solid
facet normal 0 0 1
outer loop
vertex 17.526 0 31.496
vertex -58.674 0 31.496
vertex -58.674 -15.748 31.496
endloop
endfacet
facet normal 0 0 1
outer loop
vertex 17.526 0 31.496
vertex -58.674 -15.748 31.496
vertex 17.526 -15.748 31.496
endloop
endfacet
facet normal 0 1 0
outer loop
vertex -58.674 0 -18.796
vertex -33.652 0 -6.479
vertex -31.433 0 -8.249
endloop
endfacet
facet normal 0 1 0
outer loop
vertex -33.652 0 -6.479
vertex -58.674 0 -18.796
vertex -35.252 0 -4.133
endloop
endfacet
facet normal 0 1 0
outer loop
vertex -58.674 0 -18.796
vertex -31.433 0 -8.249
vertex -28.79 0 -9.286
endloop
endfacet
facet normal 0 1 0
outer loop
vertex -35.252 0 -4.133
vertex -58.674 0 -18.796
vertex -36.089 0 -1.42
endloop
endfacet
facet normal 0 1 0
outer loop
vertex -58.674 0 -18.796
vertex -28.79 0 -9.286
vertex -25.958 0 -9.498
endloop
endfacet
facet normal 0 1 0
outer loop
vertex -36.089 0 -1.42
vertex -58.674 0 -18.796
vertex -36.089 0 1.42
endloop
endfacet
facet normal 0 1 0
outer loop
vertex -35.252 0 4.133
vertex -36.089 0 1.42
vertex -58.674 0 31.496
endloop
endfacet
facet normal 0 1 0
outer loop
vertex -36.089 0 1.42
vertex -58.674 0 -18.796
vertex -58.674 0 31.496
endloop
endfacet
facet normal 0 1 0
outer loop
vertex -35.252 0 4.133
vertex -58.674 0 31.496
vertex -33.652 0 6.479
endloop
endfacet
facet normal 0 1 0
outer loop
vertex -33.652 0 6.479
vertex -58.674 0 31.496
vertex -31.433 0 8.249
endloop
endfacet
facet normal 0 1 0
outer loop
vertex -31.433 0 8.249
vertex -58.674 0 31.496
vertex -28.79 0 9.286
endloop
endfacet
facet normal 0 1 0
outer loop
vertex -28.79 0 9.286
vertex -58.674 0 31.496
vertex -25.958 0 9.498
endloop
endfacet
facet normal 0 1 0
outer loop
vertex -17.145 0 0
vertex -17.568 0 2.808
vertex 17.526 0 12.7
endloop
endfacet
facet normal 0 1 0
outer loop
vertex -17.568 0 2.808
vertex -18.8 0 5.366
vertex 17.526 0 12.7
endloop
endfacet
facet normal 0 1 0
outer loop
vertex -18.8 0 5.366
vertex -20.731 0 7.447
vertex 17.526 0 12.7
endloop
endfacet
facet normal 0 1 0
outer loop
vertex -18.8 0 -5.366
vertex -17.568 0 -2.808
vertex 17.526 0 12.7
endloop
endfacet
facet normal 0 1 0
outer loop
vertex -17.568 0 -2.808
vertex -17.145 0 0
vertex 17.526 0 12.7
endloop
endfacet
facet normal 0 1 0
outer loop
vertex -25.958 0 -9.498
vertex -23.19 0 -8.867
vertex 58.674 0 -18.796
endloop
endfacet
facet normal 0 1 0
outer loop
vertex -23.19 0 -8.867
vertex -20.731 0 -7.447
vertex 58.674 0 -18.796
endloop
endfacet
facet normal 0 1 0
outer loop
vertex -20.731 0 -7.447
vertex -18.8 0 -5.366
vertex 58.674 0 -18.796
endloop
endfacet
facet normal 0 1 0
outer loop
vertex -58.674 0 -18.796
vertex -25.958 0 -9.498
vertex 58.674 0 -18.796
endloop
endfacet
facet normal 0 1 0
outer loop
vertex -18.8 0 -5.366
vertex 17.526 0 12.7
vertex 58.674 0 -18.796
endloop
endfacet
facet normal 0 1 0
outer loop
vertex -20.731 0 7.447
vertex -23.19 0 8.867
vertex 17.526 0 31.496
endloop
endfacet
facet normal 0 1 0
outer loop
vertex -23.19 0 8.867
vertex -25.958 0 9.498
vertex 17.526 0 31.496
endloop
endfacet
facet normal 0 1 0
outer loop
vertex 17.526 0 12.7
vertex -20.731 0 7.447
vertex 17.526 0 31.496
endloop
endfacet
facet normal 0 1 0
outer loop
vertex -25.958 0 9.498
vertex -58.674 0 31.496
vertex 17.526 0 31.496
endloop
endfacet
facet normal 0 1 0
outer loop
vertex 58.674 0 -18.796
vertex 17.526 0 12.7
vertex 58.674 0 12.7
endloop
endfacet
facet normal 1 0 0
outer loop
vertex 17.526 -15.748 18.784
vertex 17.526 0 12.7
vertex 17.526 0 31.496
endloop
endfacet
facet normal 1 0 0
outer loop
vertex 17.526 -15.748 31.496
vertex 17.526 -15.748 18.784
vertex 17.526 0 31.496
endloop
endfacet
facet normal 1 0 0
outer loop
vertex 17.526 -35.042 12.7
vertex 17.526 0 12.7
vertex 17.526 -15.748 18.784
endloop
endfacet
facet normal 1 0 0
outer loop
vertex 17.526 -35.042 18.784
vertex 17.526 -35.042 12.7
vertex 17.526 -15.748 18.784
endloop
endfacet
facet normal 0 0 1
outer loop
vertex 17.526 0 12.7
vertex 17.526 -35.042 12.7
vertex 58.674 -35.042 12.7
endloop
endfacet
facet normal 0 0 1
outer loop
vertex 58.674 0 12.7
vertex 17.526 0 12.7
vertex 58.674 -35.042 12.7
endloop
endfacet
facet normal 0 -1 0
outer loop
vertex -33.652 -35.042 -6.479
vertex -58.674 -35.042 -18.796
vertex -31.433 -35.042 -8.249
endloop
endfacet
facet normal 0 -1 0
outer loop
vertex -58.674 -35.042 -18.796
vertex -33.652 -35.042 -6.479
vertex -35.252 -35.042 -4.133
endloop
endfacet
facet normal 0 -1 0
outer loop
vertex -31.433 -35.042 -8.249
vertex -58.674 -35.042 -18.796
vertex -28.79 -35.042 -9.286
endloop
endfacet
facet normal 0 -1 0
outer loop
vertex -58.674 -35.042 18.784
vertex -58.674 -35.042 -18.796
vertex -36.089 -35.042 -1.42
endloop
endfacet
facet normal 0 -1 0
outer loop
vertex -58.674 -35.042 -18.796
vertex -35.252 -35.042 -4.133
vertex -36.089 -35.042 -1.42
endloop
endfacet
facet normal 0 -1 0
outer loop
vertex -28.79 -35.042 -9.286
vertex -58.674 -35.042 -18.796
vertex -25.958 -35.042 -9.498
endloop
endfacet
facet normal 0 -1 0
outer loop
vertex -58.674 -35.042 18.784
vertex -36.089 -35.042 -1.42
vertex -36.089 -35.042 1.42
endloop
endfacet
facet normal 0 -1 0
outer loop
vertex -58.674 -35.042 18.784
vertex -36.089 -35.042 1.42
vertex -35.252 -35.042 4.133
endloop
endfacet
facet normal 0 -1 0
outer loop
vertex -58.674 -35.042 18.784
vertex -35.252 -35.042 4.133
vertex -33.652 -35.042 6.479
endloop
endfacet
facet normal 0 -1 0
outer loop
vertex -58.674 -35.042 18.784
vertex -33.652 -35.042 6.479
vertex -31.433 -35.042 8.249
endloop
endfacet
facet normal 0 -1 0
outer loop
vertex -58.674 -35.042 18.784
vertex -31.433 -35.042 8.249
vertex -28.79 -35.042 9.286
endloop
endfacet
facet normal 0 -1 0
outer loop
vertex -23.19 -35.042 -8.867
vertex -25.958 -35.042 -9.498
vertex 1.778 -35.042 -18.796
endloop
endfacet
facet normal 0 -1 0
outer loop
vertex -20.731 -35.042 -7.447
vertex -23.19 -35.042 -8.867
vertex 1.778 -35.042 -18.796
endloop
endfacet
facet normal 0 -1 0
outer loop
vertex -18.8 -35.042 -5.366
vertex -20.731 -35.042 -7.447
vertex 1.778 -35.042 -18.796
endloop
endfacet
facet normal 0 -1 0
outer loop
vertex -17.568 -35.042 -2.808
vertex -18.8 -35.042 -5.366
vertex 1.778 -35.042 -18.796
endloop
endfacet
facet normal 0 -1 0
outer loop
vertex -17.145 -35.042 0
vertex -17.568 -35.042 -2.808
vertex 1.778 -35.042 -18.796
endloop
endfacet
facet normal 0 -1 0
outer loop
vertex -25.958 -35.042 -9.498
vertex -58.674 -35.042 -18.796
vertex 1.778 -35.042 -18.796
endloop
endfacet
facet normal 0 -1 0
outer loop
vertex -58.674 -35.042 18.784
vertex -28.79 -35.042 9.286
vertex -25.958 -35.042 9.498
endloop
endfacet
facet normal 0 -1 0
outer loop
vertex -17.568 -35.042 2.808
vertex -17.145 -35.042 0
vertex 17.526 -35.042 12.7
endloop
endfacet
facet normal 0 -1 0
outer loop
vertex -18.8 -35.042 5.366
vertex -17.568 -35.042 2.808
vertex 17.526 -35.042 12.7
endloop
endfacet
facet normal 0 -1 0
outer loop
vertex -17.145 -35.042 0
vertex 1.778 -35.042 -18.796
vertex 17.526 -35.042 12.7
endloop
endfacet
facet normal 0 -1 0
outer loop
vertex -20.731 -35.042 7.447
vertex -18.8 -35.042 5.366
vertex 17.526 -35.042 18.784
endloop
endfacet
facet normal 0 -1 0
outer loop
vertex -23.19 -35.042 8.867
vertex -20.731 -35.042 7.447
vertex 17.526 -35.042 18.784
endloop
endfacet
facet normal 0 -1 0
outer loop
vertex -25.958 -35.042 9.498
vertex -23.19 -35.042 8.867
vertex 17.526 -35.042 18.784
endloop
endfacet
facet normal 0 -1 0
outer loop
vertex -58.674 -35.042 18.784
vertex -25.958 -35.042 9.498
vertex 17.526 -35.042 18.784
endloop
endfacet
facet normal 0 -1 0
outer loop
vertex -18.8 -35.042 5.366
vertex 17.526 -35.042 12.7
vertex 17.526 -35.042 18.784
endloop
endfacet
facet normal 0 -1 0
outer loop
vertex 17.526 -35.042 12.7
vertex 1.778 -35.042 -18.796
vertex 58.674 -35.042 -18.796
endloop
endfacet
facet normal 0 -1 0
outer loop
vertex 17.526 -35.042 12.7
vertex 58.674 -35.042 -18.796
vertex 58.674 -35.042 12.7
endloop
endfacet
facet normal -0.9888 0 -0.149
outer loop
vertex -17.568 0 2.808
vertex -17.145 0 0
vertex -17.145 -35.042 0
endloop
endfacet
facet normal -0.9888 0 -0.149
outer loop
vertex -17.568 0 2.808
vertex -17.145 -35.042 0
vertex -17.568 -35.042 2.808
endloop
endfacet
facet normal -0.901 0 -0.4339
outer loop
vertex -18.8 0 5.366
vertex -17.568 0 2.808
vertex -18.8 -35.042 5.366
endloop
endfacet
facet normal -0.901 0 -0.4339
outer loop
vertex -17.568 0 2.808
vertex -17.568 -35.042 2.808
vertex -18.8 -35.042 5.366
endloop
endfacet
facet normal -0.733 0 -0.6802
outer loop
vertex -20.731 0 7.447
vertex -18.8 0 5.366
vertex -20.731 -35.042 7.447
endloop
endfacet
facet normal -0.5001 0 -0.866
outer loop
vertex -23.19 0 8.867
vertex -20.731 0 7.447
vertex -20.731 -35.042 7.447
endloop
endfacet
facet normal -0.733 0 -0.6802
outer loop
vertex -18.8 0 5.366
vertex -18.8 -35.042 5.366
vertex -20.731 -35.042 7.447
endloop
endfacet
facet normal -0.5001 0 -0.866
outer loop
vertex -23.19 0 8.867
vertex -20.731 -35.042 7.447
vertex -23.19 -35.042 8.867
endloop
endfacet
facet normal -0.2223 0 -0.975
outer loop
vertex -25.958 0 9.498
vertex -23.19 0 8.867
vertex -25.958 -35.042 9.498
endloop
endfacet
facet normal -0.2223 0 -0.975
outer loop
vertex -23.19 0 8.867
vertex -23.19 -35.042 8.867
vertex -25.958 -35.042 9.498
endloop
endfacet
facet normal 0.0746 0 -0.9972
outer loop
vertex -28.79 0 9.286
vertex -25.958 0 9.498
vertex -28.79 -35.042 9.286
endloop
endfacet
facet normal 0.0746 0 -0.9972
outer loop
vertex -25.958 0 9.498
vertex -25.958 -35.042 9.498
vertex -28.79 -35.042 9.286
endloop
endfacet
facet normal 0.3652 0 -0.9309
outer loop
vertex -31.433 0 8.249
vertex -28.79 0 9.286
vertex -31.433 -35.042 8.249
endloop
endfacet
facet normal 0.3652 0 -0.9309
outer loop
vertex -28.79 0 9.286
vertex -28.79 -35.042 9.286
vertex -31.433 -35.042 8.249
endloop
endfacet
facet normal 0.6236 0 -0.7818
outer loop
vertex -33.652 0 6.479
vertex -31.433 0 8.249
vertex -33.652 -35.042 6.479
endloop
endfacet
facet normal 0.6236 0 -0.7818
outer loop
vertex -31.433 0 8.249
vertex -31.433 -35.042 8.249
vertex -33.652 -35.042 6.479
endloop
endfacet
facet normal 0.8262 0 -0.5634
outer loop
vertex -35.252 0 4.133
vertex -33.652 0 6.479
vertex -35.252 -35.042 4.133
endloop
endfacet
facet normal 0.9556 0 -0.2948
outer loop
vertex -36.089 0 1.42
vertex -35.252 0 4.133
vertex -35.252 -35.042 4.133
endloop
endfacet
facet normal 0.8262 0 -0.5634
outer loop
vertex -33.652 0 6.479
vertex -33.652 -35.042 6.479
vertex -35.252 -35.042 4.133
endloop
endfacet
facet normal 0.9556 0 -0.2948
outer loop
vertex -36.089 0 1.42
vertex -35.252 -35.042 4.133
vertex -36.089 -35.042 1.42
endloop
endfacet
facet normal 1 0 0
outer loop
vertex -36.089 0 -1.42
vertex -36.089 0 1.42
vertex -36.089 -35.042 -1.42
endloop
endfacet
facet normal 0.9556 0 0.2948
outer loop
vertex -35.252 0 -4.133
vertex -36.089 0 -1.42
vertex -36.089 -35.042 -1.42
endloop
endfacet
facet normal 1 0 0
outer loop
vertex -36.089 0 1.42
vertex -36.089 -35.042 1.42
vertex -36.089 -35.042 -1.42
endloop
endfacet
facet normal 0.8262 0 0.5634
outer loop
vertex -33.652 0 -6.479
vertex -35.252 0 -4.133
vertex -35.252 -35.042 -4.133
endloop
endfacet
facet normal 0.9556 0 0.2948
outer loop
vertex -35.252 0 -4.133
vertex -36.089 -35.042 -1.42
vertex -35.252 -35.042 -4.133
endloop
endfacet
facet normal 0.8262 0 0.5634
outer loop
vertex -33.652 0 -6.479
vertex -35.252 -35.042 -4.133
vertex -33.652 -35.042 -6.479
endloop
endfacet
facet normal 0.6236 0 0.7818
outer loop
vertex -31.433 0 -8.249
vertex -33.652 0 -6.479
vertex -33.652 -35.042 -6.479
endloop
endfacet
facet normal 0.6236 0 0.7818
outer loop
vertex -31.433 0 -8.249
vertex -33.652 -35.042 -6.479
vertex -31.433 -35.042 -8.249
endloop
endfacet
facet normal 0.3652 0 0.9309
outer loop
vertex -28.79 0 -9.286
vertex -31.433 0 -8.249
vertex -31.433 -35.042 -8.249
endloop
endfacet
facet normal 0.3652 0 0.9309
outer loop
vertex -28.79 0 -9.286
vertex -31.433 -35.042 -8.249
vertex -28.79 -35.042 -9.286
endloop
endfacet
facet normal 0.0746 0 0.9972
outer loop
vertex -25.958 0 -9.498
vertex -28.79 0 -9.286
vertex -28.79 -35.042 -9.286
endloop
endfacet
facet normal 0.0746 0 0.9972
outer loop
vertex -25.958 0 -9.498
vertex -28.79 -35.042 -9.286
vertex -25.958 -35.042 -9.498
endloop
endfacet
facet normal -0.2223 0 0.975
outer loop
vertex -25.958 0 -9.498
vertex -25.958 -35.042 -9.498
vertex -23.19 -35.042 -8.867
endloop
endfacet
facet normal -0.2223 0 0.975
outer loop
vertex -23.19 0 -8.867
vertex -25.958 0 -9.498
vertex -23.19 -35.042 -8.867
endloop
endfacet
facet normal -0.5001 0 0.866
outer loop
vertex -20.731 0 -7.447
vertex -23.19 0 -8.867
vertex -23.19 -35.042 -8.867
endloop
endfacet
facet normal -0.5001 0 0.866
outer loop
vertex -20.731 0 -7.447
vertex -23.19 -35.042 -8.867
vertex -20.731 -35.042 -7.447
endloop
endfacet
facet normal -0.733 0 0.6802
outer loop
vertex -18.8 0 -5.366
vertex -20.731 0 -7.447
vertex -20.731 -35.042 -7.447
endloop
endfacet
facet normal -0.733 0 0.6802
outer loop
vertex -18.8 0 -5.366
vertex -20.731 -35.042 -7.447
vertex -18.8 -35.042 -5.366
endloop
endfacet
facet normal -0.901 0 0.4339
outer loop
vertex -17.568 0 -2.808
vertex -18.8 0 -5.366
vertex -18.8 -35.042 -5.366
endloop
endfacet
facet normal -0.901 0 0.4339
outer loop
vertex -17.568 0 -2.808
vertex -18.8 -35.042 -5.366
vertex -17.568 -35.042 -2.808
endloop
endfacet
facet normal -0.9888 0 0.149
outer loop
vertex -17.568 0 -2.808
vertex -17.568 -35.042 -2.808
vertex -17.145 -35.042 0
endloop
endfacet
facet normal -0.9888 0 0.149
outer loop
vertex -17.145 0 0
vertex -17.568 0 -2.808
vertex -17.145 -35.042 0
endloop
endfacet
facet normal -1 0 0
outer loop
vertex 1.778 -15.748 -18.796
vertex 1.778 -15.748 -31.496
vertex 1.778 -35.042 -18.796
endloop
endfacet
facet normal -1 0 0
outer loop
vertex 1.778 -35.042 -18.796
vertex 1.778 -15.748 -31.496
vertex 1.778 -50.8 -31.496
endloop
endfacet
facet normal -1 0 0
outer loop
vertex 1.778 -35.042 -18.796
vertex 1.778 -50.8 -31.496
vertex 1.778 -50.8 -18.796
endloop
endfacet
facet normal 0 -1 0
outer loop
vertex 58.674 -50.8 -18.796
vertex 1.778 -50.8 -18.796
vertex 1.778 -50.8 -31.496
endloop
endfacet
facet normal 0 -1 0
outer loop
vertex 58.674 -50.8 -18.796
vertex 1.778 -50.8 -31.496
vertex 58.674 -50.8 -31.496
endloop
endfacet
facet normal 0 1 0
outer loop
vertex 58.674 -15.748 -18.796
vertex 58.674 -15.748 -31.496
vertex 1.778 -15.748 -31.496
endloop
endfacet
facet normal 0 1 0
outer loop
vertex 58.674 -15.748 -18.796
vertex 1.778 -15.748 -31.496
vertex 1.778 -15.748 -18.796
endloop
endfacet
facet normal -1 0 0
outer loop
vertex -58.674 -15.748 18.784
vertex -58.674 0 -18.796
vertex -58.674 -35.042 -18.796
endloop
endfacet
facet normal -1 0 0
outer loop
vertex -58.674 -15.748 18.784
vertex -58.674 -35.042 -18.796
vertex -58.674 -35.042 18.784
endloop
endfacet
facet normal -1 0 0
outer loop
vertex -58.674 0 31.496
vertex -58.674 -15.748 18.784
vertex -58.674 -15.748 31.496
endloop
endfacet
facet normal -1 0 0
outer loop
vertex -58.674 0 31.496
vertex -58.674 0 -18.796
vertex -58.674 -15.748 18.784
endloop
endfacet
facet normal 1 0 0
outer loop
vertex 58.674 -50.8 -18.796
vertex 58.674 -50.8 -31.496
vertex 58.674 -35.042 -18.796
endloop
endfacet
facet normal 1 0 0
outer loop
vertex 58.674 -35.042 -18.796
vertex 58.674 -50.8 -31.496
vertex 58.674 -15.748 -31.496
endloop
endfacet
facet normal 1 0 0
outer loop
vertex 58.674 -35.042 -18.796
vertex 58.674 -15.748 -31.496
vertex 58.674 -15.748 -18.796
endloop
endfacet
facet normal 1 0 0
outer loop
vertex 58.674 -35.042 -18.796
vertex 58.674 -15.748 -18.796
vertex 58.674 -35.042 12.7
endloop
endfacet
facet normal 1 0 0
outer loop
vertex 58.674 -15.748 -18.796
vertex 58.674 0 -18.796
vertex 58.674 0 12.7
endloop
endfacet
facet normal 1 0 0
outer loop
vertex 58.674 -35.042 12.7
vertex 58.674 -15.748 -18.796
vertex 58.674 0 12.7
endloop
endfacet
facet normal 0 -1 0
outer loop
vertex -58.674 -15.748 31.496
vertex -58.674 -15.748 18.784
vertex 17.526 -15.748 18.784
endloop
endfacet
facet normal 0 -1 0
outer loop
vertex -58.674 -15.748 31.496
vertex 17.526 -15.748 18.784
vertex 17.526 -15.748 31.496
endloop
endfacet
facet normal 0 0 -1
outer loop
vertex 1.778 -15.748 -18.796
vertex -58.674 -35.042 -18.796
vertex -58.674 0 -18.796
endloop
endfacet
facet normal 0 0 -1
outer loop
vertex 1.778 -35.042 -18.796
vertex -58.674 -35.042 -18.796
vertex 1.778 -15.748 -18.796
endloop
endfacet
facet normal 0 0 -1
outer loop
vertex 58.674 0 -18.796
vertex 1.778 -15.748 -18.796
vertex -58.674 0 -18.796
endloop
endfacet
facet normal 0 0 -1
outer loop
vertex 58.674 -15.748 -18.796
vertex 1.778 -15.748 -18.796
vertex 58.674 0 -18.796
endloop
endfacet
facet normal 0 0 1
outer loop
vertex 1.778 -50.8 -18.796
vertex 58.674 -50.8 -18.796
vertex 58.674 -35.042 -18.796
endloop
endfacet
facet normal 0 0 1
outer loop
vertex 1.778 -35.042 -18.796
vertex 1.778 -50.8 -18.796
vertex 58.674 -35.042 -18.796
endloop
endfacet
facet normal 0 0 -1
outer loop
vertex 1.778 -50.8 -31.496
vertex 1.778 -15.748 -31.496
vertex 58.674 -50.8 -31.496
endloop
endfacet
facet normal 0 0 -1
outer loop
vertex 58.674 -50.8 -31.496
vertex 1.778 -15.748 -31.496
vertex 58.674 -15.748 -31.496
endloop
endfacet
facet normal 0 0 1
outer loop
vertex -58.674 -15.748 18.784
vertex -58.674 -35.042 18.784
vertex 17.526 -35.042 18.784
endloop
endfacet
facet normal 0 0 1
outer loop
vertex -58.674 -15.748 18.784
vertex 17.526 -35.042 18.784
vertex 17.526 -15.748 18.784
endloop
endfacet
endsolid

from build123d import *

# Parameters (mm, degrees)
F0_W      = 117.348
F0_H      = 62.992
F1_DEPTH  = 50.8
F2_W      = 41.148
F2_H      = 18.796
F3_DEPTH  = 50.801
F4_W      = 60.452
F4_H      = 12.7
F5_DEPTH  = 50.801
F6_W      = 35.052
F6_H      = 12.7124151424
F7_DEPTH  = 76.201
F8_W      = 15.7580270052
F8_H      = 31.496
F9_DEPTH  = 117.349
F10_W     = 15.7580270052
F10_H     = 6.0835848576
F11_DEPTH = 76.201
F12_W     = 15.748
F12_H     = 12.7
F13_DEPTH = 117.349
F14_R     = 9.525
F15_DEPTH = 35.0429729948


with BuildPart() as f1:
    # F0 (on Front) → F1 (new body)
    with BuildSketch(Plane.XZ):
        Rectangle(F0_W, F0_H)
    extrude(amount=F1_DEPTH)

    # F2 (on face) → F3 (cut, through all)
    with BuildSketch(Plane.XZ.offset(50.8)):
        with Locations((38.1, 22.098)):
            Rectangle(F2_W, F2_H)
    extrude(amount=-F3_DEPTH, mode=Mode.SUBTRACT)

    # F4 (on face) → F5 (cut, through all)
    with BuildSketch(Plane.XZ.offset(50.8)):
        with Locations((-28.448, -25.146)):
            Rectangle(F4_W, F4_H)
    extrude(amount=-F5_DEPTH, mode=Mode.SUBTRACT)

    # F6 (on face) → F7 (cut, through all)
    with BuildSketch(Plane.YZ.offset(17.526)):
        with Locations((-33.274, 25.1397924288)):
            Rectangle(F6_W, F6_H)
    extrude(amount=-F7_DEPTH, mode=Mode.SUBTRACT)

    # F8 (on face) → F9 (cut, through all)
    with BuildSketch(Plane.YZ.offset(58.674)):
        with Locations((-42.9209864974, -3.048)):
            Rectangle(F8_W, F8_H)
    extrude(amount=-F9_DEPTH, mode=Mode.SUBTRACT)

    # F10 (on face) → F11 (cut, through all)
    with BuildSketch(Plane.YZ.offset(17.526)):
        with Locations((-42.9209864974, 15.7417924288)):
            Rectangle(F10_W, F10_H)
    extrude(amount=-F11_DEPTH, mode=Mode.SUBTRACT)

    # F12 (on face) → F13 (cut, through all)
    with BuildSketch(Plane.YZ.offset(58.674)):
        with Locations((-7.874, -25.146)):
            Rectangle(F12_W, F12_H)
    extrude(amount=-F13_DEPTH, mode=Mode.SUBTRACT)

    # F14 (on face) → F15 (cut, through all)
    with BuildSketch(Plane.XZ.offset(35.0419729948)):
        with Locations((-26.67, 0)):
            Circle(F14_R)
    extrude(amount=-F15_DEPTH, mode=Mode.SUBTRACT)


solid = f1.part
